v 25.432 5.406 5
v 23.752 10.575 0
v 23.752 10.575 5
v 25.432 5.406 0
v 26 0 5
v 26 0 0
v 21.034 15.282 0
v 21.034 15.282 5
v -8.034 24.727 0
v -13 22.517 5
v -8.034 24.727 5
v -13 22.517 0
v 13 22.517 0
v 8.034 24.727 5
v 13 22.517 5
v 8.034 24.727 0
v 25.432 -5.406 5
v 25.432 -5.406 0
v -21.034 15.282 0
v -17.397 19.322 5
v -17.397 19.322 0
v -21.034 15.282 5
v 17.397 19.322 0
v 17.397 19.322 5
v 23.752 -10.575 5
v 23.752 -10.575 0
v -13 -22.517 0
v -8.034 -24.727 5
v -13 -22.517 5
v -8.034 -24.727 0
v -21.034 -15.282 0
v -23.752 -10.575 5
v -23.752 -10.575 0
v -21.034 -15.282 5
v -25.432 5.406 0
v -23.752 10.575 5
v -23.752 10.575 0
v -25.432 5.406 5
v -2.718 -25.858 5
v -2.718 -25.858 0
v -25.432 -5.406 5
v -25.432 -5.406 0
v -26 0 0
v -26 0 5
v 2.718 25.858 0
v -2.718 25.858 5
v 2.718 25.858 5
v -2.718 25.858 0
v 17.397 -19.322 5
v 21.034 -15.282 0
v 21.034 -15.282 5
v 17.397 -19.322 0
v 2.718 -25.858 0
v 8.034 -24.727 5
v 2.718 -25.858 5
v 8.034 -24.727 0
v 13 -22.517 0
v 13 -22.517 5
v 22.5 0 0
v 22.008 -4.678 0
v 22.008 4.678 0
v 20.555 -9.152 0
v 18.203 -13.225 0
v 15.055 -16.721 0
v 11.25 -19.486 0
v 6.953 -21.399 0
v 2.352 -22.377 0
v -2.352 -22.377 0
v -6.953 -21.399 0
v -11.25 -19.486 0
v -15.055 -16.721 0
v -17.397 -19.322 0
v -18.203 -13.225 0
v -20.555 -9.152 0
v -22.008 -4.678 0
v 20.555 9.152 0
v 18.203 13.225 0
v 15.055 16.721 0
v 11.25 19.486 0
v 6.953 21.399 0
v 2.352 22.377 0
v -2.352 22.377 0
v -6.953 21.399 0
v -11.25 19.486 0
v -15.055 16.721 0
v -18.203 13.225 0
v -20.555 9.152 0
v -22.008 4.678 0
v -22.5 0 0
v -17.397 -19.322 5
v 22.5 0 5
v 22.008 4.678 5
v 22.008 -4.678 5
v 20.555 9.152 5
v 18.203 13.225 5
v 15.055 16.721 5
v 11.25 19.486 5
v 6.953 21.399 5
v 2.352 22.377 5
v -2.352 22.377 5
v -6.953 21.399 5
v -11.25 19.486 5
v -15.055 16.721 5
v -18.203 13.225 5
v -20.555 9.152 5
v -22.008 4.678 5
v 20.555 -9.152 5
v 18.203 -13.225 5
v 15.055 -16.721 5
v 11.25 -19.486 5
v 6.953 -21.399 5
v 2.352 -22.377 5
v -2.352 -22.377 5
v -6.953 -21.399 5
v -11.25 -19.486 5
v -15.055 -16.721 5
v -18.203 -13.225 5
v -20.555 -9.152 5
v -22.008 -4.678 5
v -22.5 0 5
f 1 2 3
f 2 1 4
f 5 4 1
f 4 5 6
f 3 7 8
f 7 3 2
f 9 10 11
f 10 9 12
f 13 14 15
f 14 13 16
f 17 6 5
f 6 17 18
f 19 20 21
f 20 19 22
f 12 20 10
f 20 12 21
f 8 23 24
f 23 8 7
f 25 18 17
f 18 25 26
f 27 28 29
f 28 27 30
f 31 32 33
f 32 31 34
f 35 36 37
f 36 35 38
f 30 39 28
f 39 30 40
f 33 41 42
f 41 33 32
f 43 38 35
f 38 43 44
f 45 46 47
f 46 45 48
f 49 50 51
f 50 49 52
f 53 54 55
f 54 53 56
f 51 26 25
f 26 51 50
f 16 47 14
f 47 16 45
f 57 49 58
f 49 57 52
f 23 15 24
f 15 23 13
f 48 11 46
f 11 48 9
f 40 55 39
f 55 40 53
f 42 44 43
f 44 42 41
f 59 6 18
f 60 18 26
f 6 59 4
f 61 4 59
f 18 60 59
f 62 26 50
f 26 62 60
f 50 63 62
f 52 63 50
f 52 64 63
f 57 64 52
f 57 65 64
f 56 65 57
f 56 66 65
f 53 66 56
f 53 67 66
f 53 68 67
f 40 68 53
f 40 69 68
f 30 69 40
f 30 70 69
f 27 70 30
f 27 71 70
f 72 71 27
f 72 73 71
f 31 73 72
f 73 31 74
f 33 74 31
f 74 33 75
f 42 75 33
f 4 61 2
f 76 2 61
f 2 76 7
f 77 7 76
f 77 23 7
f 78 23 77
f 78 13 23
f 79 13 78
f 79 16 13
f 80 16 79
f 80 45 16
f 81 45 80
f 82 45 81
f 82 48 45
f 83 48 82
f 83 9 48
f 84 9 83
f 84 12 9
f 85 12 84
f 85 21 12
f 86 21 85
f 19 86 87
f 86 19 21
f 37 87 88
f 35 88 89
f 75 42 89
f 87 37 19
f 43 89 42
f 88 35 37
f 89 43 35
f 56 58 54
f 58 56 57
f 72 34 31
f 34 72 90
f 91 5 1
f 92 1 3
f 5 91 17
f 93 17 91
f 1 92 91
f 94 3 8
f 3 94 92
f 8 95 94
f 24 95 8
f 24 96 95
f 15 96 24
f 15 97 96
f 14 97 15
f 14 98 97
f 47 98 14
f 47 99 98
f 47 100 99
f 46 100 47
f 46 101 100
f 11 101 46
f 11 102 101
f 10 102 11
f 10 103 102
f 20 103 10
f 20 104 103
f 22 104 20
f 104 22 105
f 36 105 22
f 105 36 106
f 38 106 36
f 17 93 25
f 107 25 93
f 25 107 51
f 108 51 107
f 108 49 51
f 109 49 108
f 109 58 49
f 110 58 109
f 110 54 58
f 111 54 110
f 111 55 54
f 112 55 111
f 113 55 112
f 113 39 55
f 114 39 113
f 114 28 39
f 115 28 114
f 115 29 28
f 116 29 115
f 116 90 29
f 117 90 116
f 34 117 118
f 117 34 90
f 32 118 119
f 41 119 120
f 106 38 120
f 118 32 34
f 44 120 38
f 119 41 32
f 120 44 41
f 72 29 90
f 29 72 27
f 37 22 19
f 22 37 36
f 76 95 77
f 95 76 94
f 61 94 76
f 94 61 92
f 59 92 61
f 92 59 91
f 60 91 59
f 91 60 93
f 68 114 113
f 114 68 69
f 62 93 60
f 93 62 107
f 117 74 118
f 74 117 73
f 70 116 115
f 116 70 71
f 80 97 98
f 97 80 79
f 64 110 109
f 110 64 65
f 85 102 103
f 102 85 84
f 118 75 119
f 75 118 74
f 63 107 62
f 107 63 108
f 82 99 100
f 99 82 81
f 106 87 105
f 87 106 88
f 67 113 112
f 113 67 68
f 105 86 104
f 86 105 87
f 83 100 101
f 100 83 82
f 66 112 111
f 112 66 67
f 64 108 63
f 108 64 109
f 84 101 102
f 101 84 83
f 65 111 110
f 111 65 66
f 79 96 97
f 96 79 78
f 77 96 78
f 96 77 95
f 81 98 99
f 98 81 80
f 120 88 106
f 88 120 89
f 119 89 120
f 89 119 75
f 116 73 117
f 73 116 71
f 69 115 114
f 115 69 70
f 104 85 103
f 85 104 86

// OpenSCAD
diameter = 52;
thickness = 5;
inner_diameter = 45;

difference() {
    cylinder(d=diameter, h=thickness);
    cylinder(d=inner_diameter, h=thickness + 1);
}
